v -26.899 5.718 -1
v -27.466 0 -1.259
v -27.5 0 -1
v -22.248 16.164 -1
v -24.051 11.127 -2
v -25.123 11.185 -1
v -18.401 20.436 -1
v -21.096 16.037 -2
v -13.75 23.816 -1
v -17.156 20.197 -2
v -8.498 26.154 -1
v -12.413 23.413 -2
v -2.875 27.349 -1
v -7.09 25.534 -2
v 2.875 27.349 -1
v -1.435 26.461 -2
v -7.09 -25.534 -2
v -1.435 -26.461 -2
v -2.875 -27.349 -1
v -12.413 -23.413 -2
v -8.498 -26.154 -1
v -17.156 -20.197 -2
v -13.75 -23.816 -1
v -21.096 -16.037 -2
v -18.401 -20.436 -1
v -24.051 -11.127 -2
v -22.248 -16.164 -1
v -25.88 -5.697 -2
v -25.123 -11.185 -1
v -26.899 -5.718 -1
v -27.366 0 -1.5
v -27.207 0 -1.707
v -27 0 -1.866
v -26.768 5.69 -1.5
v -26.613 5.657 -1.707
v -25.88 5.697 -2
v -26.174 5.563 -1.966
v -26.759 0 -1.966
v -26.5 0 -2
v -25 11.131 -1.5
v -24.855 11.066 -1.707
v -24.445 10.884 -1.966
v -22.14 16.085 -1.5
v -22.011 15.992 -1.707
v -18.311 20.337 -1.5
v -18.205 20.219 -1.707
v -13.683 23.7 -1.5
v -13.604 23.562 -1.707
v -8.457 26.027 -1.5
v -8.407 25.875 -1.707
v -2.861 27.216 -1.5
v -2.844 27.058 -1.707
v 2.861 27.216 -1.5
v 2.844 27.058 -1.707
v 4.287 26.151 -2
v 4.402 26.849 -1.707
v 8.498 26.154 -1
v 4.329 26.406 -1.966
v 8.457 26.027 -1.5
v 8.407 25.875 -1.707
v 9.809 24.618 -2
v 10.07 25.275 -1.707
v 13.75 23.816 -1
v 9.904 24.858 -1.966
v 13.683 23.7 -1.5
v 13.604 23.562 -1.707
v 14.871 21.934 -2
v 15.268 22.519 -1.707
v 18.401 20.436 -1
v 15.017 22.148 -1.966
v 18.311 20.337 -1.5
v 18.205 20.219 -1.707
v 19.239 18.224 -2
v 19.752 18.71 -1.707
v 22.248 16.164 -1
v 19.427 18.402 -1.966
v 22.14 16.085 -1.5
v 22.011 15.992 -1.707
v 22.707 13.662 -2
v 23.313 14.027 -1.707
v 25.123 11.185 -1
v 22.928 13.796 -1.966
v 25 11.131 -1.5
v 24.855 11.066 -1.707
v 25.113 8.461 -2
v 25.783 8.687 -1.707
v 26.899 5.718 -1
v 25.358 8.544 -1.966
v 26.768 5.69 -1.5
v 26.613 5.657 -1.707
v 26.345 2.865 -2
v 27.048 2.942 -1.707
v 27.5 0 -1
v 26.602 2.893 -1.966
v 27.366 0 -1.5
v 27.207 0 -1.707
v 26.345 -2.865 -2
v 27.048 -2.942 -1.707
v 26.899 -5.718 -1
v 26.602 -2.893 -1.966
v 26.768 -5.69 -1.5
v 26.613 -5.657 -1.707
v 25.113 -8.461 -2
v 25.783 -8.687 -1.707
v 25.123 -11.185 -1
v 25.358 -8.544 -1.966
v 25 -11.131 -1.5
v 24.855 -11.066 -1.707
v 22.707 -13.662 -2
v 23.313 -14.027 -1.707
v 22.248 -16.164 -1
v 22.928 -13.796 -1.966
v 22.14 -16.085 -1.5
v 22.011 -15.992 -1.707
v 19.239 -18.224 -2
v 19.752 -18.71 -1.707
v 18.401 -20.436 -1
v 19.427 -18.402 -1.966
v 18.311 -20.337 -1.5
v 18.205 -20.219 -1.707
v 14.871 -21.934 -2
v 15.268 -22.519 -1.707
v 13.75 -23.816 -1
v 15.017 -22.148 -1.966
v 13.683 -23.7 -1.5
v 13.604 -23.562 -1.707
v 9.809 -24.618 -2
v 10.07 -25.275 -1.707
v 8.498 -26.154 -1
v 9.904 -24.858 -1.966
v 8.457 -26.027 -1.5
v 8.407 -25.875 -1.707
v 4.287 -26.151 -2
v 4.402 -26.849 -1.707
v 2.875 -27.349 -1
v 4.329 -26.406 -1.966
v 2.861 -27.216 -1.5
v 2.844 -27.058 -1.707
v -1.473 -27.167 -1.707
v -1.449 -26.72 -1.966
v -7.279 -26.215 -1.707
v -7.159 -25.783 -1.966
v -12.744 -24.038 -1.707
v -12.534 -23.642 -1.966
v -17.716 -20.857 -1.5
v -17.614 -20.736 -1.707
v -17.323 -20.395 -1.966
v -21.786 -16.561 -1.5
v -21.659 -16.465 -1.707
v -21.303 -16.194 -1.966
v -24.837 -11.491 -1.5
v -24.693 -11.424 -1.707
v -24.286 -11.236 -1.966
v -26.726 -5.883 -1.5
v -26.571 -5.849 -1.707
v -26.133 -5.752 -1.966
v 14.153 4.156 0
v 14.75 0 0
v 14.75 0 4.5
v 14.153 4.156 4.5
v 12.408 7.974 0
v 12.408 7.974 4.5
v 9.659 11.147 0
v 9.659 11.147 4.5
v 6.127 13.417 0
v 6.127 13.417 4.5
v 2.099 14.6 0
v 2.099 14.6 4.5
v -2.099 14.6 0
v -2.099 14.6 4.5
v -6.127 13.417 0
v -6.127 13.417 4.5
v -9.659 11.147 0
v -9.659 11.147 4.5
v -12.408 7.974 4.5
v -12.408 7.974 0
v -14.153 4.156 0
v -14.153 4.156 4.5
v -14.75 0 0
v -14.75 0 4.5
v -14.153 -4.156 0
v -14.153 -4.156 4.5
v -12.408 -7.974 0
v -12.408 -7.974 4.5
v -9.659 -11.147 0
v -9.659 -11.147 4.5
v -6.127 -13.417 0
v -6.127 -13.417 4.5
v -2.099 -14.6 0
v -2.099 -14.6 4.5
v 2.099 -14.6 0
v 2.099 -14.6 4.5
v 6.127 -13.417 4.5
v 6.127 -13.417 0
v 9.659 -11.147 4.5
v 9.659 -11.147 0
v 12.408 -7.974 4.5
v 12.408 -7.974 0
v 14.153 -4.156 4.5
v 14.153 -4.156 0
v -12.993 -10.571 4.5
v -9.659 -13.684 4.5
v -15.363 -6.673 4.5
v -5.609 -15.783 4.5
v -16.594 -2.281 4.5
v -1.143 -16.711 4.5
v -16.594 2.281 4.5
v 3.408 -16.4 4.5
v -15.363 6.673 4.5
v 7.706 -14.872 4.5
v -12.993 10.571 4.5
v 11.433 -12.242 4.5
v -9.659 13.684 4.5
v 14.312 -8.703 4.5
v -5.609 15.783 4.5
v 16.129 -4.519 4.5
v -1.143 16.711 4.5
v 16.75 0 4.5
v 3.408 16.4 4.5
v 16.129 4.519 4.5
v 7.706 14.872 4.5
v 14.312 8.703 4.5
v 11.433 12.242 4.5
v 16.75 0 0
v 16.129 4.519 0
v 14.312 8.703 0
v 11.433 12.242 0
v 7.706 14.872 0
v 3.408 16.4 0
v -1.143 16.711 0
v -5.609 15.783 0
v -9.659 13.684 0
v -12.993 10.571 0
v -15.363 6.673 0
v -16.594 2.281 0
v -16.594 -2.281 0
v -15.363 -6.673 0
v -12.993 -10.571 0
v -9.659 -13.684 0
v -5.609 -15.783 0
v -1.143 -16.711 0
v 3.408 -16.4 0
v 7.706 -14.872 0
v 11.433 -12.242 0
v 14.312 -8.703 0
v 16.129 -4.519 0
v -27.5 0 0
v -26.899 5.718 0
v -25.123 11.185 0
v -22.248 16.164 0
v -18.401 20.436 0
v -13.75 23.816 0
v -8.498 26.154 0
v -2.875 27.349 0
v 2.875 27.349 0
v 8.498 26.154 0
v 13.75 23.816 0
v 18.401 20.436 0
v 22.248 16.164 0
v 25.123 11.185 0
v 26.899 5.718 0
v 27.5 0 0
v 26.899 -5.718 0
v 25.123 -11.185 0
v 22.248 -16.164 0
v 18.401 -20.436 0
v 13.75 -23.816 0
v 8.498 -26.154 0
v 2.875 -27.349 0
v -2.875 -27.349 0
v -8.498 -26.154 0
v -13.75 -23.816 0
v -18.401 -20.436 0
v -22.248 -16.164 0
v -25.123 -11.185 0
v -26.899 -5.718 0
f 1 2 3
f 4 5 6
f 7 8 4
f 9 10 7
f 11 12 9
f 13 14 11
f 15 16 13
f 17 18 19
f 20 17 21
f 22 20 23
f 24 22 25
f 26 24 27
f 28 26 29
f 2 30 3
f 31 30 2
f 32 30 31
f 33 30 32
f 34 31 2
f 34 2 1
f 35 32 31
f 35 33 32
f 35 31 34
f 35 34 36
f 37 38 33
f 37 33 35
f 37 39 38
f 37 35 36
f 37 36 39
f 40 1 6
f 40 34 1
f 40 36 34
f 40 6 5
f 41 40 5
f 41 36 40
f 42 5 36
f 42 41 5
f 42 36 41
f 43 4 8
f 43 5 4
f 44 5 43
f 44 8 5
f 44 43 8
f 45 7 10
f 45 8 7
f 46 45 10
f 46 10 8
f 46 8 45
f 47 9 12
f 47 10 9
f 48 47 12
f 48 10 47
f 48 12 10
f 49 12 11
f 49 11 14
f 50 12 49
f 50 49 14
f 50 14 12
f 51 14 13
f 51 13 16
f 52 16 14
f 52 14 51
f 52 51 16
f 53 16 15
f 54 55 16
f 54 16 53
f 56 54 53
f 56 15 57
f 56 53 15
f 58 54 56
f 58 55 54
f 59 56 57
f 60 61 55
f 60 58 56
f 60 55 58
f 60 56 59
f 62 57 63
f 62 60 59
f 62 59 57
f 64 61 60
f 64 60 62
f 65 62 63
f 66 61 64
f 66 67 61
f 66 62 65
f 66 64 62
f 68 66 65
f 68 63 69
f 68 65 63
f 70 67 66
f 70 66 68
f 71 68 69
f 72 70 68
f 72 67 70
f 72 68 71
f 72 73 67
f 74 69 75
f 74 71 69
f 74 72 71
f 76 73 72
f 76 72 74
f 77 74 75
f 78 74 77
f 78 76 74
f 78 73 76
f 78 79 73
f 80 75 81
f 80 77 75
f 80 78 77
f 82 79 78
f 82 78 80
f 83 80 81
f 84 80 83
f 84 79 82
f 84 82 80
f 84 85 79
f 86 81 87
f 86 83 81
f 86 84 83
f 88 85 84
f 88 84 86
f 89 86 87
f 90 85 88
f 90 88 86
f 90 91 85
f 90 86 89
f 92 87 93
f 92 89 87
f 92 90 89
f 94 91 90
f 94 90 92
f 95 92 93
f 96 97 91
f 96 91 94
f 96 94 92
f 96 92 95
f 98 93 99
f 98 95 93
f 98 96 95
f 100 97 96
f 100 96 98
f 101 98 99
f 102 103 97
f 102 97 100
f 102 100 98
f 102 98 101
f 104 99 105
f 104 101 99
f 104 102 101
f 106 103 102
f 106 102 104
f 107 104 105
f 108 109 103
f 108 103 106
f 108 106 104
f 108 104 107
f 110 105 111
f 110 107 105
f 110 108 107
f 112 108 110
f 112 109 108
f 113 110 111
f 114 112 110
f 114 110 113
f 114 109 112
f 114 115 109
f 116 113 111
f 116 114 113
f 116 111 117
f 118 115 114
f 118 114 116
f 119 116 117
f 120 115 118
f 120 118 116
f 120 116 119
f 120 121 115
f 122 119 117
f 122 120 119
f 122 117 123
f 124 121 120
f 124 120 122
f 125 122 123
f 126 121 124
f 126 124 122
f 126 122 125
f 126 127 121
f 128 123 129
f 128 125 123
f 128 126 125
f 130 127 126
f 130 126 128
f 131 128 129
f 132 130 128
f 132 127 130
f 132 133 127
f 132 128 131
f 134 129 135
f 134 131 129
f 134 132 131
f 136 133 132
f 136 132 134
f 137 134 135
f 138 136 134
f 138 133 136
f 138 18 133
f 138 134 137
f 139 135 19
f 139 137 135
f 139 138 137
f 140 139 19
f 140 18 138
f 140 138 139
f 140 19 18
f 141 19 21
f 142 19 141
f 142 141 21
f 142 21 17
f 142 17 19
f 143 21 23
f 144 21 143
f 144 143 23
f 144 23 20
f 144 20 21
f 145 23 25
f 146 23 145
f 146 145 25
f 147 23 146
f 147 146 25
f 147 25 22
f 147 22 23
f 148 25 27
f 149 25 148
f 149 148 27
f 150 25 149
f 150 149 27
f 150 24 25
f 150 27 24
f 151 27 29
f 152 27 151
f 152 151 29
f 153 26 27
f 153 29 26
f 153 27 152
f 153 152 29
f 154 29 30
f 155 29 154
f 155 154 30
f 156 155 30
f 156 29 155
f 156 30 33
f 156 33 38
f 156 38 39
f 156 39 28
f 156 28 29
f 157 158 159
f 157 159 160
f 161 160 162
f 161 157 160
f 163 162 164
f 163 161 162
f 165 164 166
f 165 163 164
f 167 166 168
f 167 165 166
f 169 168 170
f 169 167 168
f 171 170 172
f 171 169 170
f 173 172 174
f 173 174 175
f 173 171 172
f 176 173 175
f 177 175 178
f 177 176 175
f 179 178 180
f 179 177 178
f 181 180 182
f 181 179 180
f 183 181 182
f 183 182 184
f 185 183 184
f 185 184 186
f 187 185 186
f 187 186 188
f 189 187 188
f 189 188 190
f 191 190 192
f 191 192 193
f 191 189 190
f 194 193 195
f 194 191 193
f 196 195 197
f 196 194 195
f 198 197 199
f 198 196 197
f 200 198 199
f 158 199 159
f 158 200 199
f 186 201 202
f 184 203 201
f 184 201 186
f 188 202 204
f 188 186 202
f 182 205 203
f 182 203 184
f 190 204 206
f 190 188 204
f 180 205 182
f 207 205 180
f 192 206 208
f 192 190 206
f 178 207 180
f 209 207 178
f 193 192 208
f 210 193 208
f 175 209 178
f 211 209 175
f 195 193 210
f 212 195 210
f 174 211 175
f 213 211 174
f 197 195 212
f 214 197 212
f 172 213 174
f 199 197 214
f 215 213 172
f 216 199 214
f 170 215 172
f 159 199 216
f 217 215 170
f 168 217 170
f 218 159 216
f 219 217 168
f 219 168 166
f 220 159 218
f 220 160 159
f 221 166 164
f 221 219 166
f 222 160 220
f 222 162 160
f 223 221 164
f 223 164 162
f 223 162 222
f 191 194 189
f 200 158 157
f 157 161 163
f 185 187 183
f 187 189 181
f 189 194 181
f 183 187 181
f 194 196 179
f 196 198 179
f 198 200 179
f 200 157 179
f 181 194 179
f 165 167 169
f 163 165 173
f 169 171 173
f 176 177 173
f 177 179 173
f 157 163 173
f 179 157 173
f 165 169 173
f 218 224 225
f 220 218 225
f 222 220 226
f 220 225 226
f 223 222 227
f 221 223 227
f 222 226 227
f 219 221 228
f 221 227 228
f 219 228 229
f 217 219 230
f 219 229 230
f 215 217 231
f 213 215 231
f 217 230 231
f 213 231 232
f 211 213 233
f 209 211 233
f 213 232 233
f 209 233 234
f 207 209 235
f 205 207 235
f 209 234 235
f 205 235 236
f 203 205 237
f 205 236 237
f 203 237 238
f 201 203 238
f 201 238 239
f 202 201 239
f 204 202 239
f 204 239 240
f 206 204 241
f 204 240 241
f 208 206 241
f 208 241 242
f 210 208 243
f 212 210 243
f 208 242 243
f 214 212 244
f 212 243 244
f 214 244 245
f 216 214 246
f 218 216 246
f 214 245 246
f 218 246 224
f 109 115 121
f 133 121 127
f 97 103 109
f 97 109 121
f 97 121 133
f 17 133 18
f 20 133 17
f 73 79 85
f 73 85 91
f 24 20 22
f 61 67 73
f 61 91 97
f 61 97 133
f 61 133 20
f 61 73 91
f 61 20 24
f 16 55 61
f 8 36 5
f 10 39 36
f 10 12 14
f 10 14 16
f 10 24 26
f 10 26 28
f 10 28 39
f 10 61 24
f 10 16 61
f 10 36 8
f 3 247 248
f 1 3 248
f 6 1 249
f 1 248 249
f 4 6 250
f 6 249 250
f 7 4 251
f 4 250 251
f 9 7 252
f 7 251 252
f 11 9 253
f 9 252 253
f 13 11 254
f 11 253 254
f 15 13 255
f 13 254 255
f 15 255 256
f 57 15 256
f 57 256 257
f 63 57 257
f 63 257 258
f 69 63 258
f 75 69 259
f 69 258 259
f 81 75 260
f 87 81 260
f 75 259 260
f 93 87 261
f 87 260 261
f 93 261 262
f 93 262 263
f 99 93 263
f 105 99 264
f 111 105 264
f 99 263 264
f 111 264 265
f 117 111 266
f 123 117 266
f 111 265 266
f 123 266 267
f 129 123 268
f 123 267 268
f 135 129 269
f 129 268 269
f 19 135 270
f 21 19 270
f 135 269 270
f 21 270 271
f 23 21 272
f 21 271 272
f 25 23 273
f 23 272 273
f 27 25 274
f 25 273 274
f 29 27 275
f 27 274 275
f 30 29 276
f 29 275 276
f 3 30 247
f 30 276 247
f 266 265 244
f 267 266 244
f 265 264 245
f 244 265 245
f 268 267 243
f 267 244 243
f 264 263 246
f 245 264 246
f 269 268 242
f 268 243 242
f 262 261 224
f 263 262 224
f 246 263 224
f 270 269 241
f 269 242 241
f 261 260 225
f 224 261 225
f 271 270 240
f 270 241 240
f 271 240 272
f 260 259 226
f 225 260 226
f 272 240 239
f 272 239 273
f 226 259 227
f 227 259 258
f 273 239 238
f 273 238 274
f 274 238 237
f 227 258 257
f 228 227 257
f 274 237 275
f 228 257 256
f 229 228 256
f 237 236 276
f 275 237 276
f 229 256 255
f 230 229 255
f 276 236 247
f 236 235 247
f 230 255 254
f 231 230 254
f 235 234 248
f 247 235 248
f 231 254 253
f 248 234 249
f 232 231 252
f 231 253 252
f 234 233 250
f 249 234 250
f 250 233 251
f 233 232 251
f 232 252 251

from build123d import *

# Parameters (mm, degrees)
CROQUIS1_R           = 16.75
CROQUIS1_R_2         = 14.75
PESTA_AENTRADA_DEPTH = 4.5
CROQUIS2_R           = 27.5
TAPADERA_DEPTH       = 2
DETALLESUPERIOR_R    = 1


with BuildPart() as part:
    # Croquis1 → PestañaEntrada (new body)
    with BuildSketch(Plane.XY):
        Circle(CROQUIS1_R)
        Circle(CROQUIS1_R_2, mode=Mode.SUBTRACT)
    extrude(amount=PESTA_AENTRADA_DEPTH)

    # Croquis2 → Tapadera (add)
    with BuildSketch(Plane(origin=(0, 0, 0), x_dir=(-1, 0, 0), z_dir=(0, 0, -1))):
        Circle(CROQUIS2_R)
    extrude(amount=TAPADERA_DEPTH)

    # DetalleSuperior
    detallesuperior_edges = [part.edges().sort_by_distance(p)[0] for p in [
        (27.5, 0, -2),
    ]]
    fillet(detallesuperior_edges, radius=DETALLESUPERIOR_R)


solid = part.part
